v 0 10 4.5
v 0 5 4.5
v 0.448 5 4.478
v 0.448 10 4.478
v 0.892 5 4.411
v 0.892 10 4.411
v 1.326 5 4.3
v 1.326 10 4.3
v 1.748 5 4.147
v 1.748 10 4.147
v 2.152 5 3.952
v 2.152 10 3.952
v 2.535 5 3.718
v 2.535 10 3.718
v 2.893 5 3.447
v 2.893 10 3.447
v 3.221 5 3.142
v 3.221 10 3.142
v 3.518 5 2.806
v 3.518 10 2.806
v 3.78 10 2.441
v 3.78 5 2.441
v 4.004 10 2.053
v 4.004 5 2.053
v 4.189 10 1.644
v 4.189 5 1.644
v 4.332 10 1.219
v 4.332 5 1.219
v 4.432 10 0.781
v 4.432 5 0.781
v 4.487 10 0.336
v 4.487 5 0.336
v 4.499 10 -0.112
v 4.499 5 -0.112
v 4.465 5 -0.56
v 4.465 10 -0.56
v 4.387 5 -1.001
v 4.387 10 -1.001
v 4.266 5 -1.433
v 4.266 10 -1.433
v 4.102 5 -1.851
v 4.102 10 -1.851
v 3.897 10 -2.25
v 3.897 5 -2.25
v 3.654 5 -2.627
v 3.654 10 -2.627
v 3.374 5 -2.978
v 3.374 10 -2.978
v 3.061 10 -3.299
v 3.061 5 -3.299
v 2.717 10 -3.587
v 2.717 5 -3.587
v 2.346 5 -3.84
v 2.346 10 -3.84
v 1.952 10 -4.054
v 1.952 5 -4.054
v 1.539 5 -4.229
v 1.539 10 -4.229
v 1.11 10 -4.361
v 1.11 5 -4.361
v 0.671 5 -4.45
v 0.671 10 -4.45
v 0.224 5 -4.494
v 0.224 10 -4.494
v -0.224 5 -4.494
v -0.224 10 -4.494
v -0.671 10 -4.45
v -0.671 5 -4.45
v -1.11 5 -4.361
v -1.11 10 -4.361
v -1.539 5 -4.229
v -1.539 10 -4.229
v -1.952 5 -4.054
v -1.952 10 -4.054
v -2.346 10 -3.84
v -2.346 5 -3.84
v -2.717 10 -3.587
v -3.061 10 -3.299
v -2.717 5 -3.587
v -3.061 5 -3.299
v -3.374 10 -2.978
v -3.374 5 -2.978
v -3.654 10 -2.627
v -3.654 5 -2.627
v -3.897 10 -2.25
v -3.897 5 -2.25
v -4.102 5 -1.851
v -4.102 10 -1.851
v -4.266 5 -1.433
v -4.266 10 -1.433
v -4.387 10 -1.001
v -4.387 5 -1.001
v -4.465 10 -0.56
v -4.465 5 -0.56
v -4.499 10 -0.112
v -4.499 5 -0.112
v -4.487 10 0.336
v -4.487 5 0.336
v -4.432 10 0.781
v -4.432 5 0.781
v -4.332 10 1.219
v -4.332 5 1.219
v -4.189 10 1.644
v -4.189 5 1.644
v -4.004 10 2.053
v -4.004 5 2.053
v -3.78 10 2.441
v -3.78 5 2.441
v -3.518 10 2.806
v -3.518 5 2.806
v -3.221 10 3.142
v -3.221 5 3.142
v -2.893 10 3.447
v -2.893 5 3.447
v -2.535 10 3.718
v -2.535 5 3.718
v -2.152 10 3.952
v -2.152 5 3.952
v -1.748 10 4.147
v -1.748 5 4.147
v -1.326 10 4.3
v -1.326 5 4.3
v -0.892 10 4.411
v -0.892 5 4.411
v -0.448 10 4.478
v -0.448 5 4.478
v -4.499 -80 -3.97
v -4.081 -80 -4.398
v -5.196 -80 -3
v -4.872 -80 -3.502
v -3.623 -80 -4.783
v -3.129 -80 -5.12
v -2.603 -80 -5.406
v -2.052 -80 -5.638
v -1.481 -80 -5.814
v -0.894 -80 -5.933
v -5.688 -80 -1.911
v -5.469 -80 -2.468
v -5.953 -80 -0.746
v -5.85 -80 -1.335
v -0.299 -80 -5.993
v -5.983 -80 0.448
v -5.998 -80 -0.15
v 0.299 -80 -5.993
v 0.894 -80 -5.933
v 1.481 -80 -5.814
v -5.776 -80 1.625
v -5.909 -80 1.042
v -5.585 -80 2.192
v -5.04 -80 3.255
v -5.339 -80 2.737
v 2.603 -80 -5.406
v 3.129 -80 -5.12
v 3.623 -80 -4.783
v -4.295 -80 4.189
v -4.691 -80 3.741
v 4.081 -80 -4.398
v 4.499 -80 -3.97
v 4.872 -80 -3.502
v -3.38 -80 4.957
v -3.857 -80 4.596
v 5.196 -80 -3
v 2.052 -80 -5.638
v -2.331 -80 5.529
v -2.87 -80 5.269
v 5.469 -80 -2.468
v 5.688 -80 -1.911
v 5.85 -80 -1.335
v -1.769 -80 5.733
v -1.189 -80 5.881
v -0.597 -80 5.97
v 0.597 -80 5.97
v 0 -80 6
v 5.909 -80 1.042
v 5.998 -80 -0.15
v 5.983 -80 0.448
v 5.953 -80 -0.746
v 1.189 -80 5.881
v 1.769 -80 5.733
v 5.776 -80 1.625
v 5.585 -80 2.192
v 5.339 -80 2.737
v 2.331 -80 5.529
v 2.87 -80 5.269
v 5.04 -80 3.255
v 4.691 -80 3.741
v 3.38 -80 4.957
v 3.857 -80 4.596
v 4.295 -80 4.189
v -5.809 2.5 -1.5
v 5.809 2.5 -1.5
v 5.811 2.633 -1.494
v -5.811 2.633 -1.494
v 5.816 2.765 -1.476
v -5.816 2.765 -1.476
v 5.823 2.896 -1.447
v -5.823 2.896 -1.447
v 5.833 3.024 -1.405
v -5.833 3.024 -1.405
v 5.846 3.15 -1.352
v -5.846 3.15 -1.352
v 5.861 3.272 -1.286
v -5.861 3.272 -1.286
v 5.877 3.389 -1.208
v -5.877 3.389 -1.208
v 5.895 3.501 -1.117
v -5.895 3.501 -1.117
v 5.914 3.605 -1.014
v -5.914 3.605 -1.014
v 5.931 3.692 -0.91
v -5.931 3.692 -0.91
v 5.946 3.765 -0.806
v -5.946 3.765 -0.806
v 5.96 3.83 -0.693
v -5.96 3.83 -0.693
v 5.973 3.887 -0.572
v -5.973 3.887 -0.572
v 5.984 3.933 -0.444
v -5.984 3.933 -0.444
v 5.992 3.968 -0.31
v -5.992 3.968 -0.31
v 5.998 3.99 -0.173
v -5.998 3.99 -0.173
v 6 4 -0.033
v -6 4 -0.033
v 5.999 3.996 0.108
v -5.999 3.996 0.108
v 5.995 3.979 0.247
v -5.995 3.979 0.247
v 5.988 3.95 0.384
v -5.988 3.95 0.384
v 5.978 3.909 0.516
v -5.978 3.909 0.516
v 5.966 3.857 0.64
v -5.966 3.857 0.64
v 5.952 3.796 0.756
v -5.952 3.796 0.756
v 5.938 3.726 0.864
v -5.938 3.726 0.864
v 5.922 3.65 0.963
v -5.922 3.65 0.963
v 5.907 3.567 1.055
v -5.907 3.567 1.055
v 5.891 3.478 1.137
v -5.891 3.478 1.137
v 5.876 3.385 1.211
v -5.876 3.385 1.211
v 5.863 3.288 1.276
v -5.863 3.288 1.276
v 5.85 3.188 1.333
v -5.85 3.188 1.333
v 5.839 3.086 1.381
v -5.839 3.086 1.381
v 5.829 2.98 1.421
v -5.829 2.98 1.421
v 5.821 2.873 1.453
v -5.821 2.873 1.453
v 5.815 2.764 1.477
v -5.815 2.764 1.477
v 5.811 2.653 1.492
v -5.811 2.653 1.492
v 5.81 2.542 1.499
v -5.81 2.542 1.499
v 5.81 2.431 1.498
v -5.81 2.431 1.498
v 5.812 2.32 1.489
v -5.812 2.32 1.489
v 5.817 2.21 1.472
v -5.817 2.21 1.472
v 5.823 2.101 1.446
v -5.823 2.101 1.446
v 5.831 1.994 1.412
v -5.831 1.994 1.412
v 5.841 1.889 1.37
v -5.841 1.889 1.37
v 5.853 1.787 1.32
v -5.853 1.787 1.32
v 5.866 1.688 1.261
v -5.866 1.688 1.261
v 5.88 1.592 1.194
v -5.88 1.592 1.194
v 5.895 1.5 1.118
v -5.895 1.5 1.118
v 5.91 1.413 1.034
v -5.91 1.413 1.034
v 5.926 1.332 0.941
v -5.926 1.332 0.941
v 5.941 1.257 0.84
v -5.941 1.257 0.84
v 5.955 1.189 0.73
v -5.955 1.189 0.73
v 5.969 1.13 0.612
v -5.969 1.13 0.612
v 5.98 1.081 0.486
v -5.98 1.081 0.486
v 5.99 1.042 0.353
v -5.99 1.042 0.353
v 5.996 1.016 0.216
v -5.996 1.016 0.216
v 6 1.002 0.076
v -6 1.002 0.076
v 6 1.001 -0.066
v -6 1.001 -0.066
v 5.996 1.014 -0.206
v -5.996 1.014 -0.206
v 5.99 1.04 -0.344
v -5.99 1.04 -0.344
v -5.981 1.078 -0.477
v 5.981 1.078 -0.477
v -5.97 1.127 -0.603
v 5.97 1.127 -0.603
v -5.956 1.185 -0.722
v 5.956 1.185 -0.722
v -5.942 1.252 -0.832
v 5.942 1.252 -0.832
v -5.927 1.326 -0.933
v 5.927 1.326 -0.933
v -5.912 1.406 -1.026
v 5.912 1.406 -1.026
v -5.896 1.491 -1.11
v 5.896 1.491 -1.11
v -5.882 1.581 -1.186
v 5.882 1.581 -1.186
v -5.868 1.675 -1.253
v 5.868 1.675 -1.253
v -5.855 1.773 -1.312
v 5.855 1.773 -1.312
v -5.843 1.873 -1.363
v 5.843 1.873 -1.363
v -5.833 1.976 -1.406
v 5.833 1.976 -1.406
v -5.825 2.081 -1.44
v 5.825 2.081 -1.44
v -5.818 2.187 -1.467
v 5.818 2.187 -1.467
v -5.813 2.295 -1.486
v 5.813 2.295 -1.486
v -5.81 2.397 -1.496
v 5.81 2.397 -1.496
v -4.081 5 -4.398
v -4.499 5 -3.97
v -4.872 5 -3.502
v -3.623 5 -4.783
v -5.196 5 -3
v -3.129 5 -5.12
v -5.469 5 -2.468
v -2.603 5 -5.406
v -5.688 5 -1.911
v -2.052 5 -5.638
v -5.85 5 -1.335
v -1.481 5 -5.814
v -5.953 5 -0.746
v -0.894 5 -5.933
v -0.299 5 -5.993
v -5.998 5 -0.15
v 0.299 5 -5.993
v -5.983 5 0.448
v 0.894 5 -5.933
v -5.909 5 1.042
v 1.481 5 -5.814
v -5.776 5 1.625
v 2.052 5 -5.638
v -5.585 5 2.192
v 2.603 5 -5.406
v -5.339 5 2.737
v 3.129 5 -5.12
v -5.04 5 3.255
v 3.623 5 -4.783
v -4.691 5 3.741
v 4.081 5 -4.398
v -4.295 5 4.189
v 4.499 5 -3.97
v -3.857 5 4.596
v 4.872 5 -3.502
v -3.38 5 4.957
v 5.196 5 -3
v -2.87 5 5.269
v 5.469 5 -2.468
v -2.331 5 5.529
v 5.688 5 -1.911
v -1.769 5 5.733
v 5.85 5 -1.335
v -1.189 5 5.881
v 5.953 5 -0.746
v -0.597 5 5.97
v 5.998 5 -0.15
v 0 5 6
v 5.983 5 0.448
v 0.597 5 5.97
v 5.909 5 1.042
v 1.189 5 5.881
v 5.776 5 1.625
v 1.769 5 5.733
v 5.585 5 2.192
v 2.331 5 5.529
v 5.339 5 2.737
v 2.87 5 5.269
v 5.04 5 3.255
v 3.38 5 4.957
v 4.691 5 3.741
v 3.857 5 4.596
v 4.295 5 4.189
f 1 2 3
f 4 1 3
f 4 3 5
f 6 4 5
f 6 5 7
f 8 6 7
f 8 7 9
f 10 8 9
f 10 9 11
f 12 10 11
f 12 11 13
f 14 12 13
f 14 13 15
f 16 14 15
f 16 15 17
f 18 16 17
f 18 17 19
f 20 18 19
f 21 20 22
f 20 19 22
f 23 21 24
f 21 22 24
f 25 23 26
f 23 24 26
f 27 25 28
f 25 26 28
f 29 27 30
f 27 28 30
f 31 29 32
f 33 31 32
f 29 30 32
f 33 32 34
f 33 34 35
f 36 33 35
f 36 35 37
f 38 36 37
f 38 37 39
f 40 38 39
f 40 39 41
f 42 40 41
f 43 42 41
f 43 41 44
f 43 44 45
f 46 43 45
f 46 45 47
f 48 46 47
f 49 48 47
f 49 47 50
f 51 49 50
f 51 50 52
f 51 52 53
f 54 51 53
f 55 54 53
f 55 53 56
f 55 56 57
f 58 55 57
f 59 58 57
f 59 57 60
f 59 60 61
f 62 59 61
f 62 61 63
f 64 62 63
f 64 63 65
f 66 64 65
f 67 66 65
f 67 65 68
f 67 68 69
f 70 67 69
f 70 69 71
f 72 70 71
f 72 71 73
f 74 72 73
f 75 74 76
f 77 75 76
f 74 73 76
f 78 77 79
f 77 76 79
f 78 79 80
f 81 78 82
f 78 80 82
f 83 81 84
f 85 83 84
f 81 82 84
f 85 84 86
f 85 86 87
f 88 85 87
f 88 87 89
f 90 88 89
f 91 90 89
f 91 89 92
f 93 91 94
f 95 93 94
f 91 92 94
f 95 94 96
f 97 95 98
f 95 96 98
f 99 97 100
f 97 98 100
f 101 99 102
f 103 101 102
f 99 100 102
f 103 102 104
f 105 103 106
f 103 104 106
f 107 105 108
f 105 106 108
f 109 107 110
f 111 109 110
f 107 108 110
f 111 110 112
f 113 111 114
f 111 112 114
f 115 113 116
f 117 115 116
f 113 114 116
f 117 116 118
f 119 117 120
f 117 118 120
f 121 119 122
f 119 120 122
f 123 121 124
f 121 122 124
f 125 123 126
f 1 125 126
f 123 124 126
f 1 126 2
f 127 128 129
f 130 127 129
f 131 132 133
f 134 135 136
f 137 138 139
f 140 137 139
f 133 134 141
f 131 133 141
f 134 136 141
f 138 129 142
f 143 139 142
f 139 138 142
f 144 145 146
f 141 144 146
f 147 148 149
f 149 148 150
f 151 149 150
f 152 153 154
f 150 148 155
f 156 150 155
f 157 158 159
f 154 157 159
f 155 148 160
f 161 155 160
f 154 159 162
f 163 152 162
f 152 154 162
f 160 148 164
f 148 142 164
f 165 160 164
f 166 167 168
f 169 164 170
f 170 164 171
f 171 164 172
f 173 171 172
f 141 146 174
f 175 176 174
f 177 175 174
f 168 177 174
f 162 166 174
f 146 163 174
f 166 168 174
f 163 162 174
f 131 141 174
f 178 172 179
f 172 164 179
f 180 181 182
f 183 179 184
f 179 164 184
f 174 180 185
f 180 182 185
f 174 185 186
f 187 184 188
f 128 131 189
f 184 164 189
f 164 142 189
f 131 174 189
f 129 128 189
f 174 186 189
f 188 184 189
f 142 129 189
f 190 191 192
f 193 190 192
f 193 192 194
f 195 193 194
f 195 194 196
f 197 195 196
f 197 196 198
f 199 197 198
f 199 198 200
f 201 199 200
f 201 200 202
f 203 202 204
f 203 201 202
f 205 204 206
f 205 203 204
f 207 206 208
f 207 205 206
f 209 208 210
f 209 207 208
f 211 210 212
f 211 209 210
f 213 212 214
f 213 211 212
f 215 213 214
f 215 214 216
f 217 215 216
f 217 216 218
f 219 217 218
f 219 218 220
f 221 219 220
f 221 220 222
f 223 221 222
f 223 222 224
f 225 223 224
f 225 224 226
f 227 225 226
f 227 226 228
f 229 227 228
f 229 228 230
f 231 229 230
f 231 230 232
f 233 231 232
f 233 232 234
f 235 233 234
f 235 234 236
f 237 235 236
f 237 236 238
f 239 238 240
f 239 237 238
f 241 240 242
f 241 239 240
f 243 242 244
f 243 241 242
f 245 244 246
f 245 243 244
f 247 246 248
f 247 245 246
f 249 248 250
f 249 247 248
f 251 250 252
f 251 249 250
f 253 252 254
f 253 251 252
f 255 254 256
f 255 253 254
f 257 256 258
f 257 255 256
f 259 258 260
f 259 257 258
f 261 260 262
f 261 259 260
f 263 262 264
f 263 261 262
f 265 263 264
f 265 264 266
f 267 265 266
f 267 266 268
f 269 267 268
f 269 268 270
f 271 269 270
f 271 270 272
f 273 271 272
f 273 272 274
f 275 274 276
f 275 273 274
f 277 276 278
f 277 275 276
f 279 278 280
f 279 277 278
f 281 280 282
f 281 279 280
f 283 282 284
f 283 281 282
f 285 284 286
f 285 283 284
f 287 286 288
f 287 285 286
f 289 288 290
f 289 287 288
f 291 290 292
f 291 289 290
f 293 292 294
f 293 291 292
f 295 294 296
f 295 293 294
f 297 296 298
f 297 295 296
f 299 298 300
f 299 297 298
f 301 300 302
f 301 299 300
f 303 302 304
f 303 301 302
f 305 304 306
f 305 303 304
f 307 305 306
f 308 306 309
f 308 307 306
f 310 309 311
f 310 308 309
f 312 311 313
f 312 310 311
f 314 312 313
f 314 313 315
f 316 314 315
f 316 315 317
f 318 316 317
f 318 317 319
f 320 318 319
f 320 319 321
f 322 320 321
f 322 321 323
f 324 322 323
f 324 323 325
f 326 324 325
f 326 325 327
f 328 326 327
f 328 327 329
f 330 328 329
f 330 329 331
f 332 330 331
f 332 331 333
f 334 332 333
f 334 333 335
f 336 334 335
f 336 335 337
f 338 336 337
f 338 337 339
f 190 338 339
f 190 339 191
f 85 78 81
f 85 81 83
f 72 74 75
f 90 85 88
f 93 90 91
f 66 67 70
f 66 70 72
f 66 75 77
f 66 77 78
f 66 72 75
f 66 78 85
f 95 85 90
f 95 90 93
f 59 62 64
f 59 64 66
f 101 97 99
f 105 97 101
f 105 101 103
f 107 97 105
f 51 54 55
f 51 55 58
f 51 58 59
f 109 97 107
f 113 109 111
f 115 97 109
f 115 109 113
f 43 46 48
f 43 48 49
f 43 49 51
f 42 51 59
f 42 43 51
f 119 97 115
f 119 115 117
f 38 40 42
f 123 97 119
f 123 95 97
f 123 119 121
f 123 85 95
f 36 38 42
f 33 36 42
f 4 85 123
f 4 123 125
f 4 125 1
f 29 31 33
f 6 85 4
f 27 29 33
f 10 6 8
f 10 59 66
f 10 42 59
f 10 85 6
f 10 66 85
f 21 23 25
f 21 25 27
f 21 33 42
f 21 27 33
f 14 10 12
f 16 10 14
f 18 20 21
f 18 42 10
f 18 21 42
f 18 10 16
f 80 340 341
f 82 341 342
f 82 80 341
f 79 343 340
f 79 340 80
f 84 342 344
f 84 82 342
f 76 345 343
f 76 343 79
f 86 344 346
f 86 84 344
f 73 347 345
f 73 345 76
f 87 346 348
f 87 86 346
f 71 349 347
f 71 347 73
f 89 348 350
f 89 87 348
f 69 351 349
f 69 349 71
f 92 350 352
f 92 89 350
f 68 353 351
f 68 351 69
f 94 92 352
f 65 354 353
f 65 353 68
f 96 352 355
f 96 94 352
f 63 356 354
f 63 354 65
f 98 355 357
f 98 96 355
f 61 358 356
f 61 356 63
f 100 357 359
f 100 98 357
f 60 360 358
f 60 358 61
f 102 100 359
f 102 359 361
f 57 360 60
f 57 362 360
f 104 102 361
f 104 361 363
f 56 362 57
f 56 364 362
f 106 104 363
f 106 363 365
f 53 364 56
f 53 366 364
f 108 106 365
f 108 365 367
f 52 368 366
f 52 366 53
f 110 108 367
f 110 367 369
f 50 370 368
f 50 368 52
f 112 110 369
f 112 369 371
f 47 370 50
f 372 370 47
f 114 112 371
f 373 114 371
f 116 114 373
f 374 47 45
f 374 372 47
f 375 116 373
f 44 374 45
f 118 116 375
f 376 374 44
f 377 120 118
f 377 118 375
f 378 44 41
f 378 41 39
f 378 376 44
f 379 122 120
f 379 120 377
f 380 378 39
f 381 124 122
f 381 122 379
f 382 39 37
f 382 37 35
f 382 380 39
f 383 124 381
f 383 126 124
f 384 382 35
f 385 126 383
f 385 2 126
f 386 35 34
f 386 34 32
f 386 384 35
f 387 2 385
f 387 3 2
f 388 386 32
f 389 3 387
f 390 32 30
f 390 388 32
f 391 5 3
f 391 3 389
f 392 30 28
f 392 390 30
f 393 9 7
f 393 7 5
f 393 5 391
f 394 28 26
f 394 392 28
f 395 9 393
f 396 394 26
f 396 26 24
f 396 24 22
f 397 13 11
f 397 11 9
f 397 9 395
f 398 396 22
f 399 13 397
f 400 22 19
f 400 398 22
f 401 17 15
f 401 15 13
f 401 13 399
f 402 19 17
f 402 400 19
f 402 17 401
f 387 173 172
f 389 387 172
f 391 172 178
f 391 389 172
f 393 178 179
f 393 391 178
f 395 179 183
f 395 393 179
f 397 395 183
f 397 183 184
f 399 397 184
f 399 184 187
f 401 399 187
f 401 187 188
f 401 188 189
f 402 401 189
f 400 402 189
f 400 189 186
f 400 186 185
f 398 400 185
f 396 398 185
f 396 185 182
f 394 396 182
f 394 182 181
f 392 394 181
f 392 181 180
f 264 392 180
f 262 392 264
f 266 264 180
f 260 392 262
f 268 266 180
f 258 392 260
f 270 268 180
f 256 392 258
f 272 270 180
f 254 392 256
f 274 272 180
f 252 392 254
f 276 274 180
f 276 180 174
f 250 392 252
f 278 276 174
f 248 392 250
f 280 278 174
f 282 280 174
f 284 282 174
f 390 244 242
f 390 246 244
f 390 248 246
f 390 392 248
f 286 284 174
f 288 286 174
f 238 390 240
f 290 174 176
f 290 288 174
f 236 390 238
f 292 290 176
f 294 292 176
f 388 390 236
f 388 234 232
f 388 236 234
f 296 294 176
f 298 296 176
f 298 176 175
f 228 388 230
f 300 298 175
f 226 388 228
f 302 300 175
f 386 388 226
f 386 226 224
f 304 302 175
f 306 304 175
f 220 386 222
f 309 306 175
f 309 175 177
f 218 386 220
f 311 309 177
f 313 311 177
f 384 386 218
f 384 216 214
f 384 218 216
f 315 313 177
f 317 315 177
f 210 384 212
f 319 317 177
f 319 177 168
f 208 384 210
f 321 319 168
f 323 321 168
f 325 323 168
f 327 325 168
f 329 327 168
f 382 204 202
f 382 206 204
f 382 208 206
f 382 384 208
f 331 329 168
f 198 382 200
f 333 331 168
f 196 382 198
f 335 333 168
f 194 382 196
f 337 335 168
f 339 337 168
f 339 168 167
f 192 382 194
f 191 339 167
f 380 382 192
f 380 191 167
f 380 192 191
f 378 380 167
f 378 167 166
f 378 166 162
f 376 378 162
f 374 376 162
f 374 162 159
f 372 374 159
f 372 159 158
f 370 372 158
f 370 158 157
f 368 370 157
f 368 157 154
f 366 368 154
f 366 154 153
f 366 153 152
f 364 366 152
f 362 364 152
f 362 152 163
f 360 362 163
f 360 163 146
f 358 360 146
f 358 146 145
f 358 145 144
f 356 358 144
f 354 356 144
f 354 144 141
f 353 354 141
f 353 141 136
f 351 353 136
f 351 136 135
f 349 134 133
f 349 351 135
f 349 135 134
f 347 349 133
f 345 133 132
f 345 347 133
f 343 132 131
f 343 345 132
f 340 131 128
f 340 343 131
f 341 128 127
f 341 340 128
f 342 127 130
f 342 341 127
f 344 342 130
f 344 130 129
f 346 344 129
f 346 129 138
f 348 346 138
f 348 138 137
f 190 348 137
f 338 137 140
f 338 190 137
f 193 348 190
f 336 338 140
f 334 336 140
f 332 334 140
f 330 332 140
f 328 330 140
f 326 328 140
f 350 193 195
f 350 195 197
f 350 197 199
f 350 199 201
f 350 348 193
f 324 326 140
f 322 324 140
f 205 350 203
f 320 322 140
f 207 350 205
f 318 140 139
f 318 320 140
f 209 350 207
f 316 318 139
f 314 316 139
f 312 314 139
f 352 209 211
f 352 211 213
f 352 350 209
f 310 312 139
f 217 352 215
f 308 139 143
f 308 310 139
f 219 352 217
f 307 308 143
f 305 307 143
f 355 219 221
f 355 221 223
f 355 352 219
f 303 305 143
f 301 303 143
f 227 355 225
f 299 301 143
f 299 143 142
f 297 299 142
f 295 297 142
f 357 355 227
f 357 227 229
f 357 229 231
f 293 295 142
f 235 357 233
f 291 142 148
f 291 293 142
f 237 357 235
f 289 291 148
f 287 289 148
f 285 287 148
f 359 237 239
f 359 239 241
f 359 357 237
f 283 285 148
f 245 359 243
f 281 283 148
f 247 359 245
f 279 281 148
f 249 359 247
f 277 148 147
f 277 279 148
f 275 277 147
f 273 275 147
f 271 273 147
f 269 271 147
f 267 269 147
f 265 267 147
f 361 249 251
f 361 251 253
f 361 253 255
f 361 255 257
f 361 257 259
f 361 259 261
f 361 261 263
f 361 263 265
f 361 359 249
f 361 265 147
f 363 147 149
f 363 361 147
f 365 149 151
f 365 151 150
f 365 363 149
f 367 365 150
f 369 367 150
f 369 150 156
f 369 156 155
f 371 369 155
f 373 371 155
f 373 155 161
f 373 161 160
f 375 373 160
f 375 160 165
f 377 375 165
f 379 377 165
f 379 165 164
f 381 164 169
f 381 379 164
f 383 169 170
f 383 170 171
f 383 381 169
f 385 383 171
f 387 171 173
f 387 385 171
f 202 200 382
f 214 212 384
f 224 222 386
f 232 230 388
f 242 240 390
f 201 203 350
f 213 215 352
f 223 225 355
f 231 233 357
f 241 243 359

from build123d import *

# Parameters (mm, degrees)
SKETCH_1_R               = 6
EXTRUDE_1_DEPTH          = 80
SKETCH_2_R               = 4.5
EXTRUDE_2_DEPTH          = 10
EXTRUDE_START            = 5
SKETCH_3_R               = 6
EXTRUDE_3_DEPTH          = 5
CUT_EXTRUDE_1_DEPTH      = 81.448741444
CUT_EXTRUDE_1_DEPTH_BACK = 81.448741444
SKETCH_4_R               = 1.5


with BuildPart() as part:
    # Эскиз1 → Бобышка-Вытянуть1 (new body)
    with BuildSketch(Plane(origin=(0, 0, 0), x_dir=(1, 0, 0), z_dir=(0, 1, 0))):
        with Locations(Location((0, 0, 0), (0, 0, 270))):
            Circle(SKETCH_1_R)
    extrude(amount=-EXTRUDE_1_DEPTH)

    # Эскиз2 → Бобышка-Вытянуть2 (add)
    with BuildSketch(Plane(origin=(0, 0, 0), x_dir=(1, 0, 0), z_dir=(0, 1, 0))):
        with Locations(Location((0, 0, 0), (0, 0, 270))):
            Circle(SKETCH_2_R)
    extrude(amount=EXTRUDE_2_DEPTH)

    # Эскиз3 → Бобышка-Вытянуть3 (add)
    with BuildSketch(Plane(origin=(0, 0, 0), x_dir=(1, 0, 0), z_dir=(0, 1, 0)).offset(EXTRUDE_START)):
        with Locations(Location((0, 0, 0), (0, 0, 270))):
            Circle(SKETCH_3_R)
    extrude(amount=-EXTRUDE_3_DEPTH)

    # Эскиз4 → Вырез-Вытянуть1 (cut, two sides: drawn at the far end of the back side and taken through both)
    with BuildSketch(Plane(origin=(0, 0, 0), x_dir=(0, 0, -1), z_dir=(1, 0, 0)).offset(-CUT_EXTRUDE_1_DEPTH_BACK)):
        with Locations((0, 2.5)):
            Circle(SKETCH_4_R)
    extrude(amount=CUT_EXTRUDE_1_DEPTH + CUT_EXTRUDE_1_DEPTH_BACK, mode=Mode.SUBTRACT)


solid = part.part
